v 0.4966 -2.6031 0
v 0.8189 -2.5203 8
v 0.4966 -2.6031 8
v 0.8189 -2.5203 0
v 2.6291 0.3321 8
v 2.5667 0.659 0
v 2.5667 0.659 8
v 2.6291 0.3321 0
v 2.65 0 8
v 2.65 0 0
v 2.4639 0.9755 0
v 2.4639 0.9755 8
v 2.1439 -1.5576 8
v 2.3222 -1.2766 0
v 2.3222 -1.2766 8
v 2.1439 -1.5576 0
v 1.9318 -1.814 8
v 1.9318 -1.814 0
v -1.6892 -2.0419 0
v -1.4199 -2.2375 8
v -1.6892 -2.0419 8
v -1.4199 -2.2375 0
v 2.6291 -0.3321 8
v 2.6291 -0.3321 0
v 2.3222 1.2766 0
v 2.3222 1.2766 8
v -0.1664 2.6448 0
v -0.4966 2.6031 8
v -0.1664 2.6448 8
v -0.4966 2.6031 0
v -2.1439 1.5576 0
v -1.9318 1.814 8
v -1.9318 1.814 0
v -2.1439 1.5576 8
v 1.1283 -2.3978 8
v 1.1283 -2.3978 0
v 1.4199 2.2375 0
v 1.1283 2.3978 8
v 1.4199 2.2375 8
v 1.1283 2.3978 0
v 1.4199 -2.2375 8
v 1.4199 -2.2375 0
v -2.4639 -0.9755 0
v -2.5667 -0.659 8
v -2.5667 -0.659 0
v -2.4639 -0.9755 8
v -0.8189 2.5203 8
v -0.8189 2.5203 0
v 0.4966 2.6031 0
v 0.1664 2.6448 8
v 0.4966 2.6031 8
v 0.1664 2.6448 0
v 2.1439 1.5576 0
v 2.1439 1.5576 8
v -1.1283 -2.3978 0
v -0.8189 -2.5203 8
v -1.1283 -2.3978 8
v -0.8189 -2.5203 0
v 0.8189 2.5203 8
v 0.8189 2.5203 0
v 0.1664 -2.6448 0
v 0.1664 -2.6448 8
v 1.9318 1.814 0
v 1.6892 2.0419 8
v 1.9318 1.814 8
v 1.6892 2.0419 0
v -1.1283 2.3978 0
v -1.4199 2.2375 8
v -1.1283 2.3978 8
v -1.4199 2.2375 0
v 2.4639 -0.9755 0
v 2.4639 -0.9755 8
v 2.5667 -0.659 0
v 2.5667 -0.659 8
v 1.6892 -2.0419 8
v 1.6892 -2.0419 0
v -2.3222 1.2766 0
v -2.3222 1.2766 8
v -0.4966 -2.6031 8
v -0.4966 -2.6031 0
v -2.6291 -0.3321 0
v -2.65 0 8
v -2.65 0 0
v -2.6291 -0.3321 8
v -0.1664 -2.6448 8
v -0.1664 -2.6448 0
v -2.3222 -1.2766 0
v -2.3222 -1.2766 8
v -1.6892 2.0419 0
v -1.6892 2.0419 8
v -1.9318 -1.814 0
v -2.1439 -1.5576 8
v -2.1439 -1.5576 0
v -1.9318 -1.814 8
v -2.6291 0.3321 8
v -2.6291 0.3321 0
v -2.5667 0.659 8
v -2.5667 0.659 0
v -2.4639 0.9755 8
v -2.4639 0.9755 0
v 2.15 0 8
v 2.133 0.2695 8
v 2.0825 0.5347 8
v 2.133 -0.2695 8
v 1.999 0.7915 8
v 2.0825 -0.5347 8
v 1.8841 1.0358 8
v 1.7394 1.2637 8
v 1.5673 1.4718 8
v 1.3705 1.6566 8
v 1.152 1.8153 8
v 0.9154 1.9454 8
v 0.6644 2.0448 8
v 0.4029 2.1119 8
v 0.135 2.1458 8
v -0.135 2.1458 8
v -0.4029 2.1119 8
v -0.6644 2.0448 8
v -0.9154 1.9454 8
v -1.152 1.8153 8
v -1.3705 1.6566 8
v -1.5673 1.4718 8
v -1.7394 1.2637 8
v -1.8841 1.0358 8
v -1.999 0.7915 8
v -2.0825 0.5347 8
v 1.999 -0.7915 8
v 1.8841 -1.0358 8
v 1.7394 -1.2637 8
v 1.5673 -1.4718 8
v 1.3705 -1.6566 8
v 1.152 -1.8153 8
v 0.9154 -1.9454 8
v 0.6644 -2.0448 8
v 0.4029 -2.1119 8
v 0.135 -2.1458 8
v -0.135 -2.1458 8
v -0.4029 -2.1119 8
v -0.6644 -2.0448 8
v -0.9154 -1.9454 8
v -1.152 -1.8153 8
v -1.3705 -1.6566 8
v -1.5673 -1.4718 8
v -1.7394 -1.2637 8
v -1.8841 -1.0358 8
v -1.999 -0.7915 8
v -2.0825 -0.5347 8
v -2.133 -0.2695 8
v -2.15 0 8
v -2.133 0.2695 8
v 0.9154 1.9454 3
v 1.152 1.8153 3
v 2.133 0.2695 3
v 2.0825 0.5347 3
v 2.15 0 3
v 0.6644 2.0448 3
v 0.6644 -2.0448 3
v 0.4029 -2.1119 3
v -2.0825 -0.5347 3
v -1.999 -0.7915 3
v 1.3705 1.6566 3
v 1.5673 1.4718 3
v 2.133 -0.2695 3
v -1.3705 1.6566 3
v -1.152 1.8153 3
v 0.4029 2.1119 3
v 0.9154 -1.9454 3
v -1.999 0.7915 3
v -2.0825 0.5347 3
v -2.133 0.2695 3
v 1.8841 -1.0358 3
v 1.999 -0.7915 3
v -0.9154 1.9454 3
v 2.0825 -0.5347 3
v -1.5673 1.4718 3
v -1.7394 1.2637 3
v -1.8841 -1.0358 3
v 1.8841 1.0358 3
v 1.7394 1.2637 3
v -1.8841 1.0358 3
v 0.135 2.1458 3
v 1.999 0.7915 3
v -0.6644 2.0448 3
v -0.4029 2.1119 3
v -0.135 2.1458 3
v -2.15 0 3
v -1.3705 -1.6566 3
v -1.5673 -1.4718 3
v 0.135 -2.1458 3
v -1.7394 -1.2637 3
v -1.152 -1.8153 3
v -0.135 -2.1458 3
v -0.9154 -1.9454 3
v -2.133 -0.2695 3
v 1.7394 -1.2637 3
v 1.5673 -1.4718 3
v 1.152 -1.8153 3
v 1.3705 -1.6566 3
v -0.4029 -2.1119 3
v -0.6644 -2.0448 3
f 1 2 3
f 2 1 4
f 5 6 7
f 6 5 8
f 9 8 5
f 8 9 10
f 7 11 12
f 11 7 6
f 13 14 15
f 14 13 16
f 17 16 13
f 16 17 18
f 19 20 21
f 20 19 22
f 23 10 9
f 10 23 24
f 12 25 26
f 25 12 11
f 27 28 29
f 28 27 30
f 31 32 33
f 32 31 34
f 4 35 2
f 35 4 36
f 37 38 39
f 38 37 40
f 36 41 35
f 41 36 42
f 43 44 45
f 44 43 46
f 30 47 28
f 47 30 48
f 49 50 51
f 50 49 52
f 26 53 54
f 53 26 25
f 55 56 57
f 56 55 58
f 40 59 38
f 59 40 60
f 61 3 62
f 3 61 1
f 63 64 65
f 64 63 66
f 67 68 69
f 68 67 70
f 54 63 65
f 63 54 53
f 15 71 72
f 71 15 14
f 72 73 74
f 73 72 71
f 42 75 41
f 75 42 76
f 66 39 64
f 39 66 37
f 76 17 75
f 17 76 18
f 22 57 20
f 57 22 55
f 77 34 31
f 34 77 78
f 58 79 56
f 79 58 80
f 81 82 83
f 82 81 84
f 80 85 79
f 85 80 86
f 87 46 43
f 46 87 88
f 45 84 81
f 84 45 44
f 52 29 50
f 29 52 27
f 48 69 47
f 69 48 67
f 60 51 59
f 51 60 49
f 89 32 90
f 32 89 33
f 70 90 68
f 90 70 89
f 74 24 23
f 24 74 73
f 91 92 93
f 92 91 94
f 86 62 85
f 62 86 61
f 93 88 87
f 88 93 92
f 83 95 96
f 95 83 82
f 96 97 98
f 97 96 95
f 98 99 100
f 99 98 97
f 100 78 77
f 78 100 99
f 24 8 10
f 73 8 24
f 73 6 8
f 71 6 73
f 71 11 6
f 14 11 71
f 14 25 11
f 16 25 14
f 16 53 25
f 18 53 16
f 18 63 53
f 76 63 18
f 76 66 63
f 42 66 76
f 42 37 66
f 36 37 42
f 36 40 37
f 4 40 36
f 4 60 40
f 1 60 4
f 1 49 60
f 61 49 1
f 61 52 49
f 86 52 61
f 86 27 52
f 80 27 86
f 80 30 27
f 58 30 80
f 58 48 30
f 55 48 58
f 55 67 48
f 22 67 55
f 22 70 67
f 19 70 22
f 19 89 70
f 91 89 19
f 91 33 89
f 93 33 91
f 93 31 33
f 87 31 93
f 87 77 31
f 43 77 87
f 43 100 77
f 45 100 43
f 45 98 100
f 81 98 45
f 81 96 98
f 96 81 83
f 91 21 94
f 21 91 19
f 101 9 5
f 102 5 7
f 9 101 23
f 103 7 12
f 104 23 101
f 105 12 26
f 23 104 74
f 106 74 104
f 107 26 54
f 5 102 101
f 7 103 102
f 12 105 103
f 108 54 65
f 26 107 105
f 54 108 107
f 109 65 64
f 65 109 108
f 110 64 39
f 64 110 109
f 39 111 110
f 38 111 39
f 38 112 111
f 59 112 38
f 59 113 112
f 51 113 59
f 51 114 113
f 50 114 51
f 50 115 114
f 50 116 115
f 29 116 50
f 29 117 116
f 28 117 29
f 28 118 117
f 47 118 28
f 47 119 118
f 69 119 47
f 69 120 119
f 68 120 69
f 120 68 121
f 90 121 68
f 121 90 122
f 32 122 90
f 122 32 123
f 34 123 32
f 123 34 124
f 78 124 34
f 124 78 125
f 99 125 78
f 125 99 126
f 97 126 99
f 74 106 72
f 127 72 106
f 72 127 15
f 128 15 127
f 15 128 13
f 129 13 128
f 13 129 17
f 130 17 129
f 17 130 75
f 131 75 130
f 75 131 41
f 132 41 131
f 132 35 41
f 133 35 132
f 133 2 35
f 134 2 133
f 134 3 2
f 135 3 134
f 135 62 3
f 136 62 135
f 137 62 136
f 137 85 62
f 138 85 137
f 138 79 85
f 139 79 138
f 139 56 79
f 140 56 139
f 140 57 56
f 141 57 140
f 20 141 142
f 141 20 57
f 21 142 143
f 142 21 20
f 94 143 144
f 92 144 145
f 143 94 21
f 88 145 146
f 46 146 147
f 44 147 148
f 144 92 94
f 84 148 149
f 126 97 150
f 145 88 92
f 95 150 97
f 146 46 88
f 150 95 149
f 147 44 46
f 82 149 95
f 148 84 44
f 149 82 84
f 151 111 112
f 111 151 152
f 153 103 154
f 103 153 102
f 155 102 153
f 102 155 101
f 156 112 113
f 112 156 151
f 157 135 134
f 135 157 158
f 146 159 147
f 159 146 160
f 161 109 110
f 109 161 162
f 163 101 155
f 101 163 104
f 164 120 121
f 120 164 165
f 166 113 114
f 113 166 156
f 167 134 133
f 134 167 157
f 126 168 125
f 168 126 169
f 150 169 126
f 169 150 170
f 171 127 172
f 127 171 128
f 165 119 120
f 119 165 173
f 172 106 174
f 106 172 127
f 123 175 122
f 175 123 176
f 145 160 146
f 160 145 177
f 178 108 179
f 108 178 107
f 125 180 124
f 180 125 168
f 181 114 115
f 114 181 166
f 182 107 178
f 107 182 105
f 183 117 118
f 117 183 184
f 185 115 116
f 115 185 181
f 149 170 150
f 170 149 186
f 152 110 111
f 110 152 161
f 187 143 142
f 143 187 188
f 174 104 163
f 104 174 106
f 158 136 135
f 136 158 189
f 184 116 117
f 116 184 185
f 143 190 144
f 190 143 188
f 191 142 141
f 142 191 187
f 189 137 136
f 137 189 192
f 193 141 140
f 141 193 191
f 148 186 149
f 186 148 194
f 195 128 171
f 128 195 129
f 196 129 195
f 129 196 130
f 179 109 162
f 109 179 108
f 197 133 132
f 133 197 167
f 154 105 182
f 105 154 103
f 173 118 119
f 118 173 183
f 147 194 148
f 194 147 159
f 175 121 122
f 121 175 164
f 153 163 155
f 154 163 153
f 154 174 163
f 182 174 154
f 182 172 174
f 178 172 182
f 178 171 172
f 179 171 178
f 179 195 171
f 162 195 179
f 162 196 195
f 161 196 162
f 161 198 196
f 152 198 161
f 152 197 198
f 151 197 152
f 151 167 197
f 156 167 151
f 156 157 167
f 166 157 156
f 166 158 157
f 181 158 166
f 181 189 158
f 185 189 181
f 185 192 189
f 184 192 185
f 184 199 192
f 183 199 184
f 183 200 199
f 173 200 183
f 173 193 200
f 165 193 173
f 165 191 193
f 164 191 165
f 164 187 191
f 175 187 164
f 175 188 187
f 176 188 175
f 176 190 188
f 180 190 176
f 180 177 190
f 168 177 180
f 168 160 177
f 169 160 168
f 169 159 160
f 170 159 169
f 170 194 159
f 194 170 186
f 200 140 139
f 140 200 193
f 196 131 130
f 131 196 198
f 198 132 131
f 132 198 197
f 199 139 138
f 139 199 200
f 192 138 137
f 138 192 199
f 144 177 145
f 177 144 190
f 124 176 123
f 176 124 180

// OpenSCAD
$fn=50;

difference()
{
	union()
	{
		cylinder(h=3, d=5.3);
		translate([0,0,3]) cylinder(h=5, d=5.3);
	}
	translate([0,0,3]) cylinder(h=5.01, d=4.3);
}
